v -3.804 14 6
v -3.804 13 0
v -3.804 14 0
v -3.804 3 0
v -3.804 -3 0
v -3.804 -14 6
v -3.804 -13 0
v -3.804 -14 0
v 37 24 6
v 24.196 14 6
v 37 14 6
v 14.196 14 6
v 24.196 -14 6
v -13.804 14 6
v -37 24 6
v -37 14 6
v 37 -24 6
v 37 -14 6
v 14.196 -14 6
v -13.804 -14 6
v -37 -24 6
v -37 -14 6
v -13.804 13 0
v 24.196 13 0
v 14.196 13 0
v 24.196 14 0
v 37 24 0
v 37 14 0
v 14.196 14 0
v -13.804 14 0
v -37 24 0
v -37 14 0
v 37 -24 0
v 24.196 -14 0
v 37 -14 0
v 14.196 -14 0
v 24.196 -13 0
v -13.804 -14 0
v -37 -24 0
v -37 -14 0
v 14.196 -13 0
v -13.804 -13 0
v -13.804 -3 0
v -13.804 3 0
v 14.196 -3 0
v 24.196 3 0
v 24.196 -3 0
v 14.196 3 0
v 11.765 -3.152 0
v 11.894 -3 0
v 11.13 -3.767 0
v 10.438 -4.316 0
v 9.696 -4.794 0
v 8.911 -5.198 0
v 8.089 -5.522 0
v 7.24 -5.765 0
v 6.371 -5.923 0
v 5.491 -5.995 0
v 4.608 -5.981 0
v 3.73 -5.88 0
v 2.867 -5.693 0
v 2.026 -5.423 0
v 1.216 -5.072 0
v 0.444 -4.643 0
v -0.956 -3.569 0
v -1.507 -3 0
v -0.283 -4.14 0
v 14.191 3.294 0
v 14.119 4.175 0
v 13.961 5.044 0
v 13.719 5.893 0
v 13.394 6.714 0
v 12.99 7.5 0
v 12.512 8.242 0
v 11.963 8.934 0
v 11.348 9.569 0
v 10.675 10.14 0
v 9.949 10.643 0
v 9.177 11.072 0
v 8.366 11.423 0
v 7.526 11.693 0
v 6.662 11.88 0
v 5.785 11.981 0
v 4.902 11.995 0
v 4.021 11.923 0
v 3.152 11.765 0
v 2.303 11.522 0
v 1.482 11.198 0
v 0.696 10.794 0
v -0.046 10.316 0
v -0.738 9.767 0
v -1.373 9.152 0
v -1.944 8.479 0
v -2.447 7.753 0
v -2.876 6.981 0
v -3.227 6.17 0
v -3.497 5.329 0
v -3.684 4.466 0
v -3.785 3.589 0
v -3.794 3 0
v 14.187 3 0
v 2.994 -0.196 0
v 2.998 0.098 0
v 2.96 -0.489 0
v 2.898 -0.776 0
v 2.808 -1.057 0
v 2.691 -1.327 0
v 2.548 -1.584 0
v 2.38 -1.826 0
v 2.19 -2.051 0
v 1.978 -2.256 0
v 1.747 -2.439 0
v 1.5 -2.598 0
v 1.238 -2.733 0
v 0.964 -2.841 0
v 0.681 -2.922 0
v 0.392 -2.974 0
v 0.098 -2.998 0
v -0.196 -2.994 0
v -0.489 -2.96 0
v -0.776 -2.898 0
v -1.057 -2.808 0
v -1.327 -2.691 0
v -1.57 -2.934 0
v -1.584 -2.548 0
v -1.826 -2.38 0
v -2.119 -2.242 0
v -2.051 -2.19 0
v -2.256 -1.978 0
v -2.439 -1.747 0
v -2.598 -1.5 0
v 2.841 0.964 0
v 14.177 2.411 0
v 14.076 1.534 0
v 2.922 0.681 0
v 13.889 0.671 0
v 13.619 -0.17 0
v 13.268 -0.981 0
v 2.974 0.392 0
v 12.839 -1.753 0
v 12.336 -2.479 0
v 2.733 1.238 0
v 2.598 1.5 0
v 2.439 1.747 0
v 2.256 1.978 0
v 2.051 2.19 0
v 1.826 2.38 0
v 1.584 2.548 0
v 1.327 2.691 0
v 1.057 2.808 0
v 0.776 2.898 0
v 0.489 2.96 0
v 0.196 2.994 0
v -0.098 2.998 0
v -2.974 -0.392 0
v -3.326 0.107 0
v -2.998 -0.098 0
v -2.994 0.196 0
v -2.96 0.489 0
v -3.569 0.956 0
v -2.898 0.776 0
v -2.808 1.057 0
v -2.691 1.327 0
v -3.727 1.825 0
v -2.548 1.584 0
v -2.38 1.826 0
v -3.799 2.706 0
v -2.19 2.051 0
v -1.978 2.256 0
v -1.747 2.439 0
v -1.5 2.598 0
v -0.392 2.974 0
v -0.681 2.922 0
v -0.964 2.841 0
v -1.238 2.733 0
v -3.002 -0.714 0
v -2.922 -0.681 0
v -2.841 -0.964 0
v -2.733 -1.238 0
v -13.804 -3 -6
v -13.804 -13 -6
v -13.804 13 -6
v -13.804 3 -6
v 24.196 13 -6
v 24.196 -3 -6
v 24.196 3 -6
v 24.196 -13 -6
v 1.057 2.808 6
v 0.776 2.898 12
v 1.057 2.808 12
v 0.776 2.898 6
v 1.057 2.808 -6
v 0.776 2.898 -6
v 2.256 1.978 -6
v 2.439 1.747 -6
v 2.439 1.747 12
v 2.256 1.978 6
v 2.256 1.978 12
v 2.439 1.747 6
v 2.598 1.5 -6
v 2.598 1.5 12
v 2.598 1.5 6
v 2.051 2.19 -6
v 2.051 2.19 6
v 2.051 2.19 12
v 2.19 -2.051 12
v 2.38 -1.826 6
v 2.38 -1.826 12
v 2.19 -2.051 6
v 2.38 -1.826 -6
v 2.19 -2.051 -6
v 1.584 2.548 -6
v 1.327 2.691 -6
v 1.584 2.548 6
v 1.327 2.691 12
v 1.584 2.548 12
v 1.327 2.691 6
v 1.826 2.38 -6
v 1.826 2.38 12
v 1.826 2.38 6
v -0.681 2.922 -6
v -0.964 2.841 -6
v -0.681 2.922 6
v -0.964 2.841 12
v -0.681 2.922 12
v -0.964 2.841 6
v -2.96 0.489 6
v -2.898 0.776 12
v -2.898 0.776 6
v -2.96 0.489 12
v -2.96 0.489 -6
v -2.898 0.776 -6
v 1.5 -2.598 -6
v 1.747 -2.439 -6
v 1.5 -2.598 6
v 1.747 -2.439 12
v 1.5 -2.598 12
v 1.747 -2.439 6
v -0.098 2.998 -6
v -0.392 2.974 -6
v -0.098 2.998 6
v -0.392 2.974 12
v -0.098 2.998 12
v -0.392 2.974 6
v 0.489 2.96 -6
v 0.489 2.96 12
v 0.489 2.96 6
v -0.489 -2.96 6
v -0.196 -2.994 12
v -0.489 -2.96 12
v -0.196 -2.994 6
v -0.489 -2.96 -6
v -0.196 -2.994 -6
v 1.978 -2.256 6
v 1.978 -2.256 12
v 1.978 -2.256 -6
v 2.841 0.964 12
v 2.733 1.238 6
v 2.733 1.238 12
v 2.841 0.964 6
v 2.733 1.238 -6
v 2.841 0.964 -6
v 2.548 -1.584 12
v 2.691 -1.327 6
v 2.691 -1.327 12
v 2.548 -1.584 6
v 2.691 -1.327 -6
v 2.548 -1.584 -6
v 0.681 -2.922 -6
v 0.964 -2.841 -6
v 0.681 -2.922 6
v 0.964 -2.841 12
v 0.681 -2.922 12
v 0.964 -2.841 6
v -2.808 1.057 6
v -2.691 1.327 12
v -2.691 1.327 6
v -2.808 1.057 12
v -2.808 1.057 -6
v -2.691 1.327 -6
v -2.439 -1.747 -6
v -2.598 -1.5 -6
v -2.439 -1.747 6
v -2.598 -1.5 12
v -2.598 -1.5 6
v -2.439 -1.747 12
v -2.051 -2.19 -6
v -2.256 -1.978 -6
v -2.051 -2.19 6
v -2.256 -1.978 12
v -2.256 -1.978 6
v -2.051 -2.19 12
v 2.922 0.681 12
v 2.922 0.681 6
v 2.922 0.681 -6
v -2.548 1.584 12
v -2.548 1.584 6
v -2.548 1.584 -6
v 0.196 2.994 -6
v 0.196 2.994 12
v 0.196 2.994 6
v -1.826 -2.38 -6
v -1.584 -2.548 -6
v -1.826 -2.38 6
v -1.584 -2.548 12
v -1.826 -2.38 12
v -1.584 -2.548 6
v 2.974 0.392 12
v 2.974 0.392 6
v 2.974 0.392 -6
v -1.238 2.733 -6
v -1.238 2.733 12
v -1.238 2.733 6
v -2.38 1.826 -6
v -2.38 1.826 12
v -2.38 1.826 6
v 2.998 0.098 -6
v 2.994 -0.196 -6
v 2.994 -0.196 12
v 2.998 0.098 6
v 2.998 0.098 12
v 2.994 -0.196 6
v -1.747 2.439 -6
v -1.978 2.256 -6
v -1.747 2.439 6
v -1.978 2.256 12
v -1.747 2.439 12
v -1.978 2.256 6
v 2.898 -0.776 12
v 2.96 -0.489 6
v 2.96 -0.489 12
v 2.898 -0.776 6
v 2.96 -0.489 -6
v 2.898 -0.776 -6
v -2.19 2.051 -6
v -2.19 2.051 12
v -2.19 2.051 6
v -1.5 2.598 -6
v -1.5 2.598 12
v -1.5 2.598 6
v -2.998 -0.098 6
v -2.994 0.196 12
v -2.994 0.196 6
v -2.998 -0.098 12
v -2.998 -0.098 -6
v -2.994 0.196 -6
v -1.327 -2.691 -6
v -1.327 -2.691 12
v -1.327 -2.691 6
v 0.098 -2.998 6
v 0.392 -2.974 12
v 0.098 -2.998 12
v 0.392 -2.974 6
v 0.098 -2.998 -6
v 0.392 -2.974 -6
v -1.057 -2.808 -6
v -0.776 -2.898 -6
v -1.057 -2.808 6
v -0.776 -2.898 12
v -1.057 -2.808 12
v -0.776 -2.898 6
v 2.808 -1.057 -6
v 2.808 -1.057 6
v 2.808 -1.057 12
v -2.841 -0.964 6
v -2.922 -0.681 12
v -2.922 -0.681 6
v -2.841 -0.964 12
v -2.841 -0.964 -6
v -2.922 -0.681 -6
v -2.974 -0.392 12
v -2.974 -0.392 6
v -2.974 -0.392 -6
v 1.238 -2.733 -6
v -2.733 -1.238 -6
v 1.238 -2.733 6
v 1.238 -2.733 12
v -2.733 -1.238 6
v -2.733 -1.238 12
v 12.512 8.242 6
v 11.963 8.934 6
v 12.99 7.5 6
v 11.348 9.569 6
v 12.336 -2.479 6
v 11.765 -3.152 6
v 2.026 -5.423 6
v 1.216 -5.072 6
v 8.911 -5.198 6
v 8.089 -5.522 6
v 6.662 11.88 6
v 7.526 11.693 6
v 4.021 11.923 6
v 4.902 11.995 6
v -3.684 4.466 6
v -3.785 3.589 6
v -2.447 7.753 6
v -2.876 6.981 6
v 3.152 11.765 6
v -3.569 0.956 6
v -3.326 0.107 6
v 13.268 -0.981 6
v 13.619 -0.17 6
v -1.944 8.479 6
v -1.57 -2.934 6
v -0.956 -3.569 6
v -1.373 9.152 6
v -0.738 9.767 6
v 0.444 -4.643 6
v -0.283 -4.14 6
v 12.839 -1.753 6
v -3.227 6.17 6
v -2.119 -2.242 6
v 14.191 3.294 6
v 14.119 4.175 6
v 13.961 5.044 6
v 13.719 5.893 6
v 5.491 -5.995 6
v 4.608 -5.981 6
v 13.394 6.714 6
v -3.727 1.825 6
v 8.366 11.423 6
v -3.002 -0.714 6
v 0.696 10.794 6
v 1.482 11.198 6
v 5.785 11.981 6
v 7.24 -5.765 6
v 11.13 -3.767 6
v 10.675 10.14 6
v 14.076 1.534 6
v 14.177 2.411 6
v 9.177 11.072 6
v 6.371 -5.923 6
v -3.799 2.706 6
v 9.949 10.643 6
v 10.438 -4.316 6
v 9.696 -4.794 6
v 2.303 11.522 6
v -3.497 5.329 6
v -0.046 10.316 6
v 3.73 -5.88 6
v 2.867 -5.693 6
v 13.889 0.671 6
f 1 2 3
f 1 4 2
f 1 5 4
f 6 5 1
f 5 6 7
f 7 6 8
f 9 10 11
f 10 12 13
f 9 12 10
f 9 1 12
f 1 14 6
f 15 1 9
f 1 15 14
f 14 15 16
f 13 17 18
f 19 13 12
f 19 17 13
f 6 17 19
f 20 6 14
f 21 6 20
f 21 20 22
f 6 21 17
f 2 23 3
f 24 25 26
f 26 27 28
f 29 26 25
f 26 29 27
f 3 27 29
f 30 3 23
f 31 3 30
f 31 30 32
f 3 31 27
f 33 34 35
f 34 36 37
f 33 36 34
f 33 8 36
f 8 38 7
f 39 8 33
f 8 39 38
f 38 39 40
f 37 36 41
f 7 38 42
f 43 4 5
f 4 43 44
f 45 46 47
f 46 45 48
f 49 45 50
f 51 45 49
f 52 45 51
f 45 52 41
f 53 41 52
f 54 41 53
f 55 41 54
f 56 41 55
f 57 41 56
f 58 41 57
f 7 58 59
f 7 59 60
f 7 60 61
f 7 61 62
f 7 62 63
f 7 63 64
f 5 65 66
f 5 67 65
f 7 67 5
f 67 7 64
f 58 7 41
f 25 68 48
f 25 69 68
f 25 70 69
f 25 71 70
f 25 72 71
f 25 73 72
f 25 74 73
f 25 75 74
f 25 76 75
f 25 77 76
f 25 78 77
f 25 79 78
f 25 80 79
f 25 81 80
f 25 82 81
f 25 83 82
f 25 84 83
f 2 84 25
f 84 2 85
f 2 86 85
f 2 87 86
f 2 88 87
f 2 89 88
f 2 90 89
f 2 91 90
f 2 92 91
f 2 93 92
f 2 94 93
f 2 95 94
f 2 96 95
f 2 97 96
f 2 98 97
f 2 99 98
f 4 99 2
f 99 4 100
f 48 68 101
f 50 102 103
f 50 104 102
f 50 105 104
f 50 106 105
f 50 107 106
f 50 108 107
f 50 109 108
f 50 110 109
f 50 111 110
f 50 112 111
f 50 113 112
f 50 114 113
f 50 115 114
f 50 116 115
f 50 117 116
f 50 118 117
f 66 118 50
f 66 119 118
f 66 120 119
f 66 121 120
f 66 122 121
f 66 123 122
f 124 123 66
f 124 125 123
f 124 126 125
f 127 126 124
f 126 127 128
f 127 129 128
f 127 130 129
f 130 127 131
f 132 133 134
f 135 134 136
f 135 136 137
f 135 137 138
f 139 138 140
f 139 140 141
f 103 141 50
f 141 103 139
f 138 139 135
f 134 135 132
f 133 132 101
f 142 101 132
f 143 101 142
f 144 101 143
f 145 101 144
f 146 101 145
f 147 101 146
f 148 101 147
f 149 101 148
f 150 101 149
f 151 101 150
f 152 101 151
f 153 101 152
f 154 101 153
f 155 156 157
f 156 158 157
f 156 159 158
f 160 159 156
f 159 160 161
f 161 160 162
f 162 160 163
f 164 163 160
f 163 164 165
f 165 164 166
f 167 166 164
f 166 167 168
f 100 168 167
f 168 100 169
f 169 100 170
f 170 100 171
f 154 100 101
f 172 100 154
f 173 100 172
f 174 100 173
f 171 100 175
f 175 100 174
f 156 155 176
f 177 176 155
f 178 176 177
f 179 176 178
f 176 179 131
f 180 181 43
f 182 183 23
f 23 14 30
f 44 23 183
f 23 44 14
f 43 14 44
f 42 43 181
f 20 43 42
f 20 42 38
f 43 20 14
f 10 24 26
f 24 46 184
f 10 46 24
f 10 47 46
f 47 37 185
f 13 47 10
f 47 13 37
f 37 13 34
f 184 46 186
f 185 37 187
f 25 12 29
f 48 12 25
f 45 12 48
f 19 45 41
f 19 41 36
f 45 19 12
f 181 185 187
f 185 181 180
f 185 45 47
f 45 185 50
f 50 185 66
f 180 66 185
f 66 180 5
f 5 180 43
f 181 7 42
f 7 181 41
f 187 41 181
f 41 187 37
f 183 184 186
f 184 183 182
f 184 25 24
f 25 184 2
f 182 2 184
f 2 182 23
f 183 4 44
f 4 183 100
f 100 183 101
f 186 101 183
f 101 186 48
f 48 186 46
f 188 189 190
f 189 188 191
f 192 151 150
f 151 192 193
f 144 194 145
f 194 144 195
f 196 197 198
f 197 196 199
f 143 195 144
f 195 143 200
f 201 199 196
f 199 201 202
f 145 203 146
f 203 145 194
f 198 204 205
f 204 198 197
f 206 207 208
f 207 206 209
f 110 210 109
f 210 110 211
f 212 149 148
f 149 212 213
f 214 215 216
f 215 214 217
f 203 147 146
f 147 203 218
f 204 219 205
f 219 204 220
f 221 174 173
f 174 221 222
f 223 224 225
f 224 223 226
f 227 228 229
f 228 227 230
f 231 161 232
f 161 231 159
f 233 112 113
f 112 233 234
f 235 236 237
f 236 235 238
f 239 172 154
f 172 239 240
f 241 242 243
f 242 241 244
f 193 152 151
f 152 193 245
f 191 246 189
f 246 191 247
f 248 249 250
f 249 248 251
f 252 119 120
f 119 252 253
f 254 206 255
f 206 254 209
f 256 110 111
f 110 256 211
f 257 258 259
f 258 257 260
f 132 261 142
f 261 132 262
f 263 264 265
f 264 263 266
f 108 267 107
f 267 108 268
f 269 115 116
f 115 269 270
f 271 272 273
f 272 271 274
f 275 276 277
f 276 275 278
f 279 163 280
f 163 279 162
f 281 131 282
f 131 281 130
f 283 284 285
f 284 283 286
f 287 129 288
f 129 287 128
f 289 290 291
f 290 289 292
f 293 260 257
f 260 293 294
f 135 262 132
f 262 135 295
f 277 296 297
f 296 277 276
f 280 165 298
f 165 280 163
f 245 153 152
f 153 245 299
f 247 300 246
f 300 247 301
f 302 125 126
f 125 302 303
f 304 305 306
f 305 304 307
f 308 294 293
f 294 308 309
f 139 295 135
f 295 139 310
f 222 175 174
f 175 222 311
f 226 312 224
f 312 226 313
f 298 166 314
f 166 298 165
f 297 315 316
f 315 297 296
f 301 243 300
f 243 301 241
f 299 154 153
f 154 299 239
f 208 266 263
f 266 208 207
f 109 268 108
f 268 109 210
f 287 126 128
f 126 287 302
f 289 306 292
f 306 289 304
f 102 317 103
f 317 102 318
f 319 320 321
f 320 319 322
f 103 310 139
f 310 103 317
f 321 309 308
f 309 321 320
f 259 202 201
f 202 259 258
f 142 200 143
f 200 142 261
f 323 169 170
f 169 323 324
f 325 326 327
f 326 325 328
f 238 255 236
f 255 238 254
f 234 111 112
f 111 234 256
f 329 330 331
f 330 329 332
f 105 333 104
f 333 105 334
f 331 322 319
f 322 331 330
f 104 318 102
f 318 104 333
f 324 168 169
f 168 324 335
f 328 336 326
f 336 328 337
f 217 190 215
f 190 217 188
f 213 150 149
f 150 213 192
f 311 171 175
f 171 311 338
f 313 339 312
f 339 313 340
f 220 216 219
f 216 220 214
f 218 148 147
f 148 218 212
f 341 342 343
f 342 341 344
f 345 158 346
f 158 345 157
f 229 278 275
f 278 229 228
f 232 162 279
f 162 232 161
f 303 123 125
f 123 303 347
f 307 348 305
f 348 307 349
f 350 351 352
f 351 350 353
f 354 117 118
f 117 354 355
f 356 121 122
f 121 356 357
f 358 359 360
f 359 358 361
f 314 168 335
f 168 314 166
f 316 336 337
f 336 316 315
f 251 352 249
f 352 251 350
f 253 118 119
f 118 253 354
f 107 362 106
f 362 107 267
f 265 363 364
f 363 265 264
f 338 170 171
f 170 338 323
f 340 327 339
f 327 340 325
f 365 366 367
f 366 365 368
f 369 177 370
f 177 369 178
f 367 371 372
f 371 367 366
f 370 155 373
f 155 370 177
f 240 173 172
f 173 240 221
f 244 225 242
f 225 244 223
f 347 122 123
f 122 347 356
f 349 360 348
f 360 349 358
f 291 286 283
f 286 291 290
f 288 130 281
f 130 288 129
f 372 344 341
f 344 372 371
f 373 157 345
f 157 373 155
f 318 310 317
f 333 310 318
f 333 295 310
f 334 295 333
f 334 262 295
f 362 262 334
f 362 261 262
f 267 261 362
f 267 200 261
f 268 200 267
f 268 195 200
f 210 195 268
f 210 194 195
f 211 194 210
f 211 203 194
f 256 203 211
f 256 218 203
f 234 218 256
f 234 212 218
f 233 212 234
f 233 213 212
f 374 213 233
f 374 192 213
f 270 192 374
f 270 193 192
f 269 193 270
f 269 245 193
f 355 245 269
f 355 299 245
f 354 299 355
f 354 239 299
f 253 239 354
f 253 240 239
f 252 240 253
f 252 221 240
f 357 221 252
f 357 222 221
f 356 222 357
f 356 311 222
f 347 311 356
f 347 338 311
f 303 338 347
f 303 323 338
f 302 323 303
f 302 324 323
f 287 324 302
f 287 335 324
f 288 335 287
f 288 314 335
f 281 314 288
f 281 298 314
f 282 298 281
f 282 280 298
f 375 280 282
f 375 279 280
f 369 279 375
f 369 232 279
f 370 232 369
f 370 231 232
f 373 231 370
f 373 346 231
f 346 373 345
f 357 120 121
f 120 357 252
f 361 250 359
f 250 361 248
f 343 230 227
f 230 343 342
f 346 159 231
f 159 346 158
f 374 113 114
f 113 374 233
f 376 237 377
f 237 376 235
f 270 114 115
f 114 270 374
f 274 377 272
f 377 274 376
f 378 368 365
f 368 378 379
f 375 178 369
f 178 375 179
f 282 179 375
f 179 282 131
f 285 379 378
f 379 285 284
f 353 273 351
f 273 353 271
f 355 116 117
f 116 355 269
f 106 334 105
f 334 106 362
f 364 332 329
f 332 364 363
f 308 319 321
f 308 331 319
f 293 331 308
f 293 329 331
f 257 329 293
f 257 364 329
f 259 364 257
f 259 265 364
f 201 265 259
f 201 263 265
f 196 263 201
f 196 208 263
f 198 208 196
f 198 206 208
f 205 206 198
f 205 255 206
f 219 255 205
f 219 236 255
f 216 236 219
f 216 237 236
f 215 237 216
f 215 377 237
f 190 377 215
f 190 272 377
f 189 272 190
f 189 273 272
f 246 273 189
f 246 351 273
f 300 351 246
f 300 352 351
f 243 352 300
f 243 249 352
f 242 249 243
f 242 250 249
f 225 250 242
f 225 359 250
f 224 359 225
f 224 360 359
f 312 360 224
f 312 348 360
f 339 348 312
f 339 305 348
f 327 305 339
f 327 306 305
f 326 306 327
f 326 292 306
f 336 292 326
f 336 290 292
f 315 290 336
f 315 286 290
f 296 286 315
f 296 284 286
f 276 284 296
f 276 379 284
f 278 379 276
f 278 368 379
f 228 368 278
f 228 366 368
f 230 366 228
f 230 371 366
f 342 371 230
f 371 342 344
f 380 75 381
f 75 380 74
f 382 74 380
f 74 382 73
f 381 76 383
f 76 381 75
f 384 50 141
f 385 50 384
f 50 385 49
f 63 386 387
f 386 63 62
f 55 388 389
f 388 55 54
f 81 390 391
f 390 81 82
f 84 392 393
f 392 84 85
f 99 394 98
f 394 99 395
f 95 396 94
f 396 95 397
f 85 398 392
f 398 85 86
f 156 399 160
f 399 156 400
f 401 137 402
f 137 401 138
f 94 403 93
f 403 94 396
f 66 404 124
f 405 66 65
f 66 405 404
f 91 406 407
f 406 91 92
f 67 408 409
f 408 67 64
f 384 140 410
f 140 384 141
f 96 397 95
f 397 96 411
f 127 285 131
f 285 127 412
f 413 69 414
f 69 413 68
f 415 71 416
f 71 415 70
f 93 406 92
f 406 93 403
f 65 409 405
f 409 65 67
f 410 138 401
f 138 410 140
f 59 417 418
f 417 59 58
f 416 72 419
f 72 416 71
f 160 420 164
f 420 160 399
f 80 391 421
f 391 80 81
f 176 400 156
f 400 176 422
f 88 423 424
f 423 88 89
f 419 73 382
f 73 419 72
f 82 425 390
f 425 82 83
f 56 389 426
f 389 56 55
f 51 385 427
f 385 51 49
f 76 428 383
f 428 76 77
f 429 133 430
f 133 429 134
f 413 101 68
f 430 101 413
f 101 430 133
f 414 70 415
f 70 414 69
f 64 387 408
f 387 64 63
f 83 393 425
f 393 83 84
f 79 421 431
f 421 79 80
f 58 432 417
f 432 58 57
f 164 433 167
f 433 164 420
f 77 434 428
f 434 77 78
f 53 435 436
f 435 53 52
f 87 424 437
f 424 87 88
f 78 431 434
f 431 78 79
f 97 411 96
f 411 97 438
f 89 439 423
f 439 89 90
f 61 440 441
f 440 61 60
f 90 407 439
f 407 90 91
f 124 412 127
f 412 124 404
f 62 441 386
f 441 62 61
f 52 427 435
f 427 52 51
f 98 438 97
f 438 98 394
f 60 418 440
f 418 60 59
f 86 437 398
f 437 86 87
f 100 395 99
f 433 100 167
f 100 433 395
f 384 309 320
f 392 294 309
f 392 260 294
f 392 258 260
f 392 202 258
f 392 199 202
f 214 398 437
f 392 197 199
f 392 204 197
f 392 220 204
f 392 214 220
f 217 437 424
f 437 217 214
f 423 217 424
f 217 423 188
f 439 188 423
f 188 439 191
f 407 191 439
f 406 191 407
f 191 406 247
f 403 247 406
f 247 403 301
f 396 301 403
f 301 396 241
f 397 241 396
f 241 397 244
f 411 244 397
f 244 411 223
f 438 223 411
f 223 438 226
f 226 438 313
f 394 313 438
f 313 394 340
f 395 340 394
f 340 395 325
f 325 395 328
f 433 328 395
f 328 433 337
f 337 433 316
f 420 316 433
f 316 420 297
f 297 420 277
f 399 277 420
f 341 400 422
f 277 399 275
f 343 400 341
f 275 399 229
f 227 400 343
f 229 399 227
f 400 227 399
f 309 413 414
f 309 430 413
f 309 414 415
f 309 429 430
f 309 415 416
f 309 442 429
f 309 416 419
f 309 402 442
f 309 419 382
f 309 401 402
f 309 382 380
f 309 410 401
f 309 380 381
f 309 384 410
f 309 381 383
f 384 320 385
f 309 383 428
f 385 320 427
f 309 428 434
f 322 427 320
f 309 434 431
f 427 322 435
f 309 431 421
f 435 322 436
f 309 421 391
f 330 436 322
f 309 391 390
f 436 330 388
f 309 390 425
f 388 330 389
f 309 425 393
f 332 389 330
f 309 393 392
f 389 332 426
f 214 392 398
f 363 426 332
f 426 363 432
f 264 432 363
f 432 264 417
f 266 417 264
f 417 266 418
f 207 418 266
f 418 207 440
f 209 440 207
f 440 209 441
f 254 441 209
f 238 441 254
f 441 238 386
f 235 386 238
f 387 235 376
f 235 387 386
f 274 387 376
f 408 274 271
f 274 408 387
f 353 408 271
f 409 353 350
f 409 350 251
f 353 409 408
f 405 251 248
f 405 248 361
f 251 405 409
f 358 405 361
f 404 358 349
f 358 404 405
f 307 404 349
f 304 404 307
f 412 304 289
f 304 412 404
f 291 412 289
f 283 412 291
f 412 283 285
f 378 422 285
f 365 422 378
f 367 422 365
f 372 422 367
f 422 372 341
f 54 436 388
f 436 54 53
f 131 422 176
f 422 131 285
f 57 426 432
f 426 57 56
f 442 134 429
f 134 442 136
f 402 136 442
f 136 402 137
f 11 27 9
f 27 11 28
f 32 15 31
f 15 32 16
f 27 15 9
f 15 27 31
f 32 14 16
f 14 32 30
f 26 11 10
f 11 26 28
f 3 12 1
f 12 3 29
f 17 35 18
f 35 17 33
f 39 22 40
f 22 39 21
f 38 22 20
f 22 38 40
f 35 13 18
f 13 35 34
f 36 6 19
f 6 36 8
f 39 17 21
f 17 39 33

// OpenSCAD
$time = 30;

h=6;
cr = 9;
mr = 6;
fw = 10;


module OF(){
    translate([-fw-(cr-mr),-(cr+mr),0])cube([fw,(cr+mr)*2,h]);
    translate([(cr+mr),-(cr+mr),0])cube([fw,(cr+mr)*2,h]);
    translate([-fw-(cr-mr),-3-fw,-h])cube([fw*2+cr*2,fw,h]);
    translate([-fw-(cr-mr),3,-h])cube([fw*2+cr*2,fw,h]);
}
    


module OC(){
    translate([0,0,-h])cylinder(r=3,h=h*3,$fn=64);
    translate([mr,0,0])cylinder(r=cr,h=h,$fn=64);
}

translate([-fw-(cr-mr)-mr*4,3+fw+1,0])cube([fw*2+cr*2+mr*6,fw,h]);
translate([-fw-(cr-mr)-mr*4,-3-2*fw-1,0])cube([fw*2+cr*2+mr*6,fw,h]);

translate([mr*(cos($time)-1),0,0])OF();
rotate([0,0,$time])OC();
